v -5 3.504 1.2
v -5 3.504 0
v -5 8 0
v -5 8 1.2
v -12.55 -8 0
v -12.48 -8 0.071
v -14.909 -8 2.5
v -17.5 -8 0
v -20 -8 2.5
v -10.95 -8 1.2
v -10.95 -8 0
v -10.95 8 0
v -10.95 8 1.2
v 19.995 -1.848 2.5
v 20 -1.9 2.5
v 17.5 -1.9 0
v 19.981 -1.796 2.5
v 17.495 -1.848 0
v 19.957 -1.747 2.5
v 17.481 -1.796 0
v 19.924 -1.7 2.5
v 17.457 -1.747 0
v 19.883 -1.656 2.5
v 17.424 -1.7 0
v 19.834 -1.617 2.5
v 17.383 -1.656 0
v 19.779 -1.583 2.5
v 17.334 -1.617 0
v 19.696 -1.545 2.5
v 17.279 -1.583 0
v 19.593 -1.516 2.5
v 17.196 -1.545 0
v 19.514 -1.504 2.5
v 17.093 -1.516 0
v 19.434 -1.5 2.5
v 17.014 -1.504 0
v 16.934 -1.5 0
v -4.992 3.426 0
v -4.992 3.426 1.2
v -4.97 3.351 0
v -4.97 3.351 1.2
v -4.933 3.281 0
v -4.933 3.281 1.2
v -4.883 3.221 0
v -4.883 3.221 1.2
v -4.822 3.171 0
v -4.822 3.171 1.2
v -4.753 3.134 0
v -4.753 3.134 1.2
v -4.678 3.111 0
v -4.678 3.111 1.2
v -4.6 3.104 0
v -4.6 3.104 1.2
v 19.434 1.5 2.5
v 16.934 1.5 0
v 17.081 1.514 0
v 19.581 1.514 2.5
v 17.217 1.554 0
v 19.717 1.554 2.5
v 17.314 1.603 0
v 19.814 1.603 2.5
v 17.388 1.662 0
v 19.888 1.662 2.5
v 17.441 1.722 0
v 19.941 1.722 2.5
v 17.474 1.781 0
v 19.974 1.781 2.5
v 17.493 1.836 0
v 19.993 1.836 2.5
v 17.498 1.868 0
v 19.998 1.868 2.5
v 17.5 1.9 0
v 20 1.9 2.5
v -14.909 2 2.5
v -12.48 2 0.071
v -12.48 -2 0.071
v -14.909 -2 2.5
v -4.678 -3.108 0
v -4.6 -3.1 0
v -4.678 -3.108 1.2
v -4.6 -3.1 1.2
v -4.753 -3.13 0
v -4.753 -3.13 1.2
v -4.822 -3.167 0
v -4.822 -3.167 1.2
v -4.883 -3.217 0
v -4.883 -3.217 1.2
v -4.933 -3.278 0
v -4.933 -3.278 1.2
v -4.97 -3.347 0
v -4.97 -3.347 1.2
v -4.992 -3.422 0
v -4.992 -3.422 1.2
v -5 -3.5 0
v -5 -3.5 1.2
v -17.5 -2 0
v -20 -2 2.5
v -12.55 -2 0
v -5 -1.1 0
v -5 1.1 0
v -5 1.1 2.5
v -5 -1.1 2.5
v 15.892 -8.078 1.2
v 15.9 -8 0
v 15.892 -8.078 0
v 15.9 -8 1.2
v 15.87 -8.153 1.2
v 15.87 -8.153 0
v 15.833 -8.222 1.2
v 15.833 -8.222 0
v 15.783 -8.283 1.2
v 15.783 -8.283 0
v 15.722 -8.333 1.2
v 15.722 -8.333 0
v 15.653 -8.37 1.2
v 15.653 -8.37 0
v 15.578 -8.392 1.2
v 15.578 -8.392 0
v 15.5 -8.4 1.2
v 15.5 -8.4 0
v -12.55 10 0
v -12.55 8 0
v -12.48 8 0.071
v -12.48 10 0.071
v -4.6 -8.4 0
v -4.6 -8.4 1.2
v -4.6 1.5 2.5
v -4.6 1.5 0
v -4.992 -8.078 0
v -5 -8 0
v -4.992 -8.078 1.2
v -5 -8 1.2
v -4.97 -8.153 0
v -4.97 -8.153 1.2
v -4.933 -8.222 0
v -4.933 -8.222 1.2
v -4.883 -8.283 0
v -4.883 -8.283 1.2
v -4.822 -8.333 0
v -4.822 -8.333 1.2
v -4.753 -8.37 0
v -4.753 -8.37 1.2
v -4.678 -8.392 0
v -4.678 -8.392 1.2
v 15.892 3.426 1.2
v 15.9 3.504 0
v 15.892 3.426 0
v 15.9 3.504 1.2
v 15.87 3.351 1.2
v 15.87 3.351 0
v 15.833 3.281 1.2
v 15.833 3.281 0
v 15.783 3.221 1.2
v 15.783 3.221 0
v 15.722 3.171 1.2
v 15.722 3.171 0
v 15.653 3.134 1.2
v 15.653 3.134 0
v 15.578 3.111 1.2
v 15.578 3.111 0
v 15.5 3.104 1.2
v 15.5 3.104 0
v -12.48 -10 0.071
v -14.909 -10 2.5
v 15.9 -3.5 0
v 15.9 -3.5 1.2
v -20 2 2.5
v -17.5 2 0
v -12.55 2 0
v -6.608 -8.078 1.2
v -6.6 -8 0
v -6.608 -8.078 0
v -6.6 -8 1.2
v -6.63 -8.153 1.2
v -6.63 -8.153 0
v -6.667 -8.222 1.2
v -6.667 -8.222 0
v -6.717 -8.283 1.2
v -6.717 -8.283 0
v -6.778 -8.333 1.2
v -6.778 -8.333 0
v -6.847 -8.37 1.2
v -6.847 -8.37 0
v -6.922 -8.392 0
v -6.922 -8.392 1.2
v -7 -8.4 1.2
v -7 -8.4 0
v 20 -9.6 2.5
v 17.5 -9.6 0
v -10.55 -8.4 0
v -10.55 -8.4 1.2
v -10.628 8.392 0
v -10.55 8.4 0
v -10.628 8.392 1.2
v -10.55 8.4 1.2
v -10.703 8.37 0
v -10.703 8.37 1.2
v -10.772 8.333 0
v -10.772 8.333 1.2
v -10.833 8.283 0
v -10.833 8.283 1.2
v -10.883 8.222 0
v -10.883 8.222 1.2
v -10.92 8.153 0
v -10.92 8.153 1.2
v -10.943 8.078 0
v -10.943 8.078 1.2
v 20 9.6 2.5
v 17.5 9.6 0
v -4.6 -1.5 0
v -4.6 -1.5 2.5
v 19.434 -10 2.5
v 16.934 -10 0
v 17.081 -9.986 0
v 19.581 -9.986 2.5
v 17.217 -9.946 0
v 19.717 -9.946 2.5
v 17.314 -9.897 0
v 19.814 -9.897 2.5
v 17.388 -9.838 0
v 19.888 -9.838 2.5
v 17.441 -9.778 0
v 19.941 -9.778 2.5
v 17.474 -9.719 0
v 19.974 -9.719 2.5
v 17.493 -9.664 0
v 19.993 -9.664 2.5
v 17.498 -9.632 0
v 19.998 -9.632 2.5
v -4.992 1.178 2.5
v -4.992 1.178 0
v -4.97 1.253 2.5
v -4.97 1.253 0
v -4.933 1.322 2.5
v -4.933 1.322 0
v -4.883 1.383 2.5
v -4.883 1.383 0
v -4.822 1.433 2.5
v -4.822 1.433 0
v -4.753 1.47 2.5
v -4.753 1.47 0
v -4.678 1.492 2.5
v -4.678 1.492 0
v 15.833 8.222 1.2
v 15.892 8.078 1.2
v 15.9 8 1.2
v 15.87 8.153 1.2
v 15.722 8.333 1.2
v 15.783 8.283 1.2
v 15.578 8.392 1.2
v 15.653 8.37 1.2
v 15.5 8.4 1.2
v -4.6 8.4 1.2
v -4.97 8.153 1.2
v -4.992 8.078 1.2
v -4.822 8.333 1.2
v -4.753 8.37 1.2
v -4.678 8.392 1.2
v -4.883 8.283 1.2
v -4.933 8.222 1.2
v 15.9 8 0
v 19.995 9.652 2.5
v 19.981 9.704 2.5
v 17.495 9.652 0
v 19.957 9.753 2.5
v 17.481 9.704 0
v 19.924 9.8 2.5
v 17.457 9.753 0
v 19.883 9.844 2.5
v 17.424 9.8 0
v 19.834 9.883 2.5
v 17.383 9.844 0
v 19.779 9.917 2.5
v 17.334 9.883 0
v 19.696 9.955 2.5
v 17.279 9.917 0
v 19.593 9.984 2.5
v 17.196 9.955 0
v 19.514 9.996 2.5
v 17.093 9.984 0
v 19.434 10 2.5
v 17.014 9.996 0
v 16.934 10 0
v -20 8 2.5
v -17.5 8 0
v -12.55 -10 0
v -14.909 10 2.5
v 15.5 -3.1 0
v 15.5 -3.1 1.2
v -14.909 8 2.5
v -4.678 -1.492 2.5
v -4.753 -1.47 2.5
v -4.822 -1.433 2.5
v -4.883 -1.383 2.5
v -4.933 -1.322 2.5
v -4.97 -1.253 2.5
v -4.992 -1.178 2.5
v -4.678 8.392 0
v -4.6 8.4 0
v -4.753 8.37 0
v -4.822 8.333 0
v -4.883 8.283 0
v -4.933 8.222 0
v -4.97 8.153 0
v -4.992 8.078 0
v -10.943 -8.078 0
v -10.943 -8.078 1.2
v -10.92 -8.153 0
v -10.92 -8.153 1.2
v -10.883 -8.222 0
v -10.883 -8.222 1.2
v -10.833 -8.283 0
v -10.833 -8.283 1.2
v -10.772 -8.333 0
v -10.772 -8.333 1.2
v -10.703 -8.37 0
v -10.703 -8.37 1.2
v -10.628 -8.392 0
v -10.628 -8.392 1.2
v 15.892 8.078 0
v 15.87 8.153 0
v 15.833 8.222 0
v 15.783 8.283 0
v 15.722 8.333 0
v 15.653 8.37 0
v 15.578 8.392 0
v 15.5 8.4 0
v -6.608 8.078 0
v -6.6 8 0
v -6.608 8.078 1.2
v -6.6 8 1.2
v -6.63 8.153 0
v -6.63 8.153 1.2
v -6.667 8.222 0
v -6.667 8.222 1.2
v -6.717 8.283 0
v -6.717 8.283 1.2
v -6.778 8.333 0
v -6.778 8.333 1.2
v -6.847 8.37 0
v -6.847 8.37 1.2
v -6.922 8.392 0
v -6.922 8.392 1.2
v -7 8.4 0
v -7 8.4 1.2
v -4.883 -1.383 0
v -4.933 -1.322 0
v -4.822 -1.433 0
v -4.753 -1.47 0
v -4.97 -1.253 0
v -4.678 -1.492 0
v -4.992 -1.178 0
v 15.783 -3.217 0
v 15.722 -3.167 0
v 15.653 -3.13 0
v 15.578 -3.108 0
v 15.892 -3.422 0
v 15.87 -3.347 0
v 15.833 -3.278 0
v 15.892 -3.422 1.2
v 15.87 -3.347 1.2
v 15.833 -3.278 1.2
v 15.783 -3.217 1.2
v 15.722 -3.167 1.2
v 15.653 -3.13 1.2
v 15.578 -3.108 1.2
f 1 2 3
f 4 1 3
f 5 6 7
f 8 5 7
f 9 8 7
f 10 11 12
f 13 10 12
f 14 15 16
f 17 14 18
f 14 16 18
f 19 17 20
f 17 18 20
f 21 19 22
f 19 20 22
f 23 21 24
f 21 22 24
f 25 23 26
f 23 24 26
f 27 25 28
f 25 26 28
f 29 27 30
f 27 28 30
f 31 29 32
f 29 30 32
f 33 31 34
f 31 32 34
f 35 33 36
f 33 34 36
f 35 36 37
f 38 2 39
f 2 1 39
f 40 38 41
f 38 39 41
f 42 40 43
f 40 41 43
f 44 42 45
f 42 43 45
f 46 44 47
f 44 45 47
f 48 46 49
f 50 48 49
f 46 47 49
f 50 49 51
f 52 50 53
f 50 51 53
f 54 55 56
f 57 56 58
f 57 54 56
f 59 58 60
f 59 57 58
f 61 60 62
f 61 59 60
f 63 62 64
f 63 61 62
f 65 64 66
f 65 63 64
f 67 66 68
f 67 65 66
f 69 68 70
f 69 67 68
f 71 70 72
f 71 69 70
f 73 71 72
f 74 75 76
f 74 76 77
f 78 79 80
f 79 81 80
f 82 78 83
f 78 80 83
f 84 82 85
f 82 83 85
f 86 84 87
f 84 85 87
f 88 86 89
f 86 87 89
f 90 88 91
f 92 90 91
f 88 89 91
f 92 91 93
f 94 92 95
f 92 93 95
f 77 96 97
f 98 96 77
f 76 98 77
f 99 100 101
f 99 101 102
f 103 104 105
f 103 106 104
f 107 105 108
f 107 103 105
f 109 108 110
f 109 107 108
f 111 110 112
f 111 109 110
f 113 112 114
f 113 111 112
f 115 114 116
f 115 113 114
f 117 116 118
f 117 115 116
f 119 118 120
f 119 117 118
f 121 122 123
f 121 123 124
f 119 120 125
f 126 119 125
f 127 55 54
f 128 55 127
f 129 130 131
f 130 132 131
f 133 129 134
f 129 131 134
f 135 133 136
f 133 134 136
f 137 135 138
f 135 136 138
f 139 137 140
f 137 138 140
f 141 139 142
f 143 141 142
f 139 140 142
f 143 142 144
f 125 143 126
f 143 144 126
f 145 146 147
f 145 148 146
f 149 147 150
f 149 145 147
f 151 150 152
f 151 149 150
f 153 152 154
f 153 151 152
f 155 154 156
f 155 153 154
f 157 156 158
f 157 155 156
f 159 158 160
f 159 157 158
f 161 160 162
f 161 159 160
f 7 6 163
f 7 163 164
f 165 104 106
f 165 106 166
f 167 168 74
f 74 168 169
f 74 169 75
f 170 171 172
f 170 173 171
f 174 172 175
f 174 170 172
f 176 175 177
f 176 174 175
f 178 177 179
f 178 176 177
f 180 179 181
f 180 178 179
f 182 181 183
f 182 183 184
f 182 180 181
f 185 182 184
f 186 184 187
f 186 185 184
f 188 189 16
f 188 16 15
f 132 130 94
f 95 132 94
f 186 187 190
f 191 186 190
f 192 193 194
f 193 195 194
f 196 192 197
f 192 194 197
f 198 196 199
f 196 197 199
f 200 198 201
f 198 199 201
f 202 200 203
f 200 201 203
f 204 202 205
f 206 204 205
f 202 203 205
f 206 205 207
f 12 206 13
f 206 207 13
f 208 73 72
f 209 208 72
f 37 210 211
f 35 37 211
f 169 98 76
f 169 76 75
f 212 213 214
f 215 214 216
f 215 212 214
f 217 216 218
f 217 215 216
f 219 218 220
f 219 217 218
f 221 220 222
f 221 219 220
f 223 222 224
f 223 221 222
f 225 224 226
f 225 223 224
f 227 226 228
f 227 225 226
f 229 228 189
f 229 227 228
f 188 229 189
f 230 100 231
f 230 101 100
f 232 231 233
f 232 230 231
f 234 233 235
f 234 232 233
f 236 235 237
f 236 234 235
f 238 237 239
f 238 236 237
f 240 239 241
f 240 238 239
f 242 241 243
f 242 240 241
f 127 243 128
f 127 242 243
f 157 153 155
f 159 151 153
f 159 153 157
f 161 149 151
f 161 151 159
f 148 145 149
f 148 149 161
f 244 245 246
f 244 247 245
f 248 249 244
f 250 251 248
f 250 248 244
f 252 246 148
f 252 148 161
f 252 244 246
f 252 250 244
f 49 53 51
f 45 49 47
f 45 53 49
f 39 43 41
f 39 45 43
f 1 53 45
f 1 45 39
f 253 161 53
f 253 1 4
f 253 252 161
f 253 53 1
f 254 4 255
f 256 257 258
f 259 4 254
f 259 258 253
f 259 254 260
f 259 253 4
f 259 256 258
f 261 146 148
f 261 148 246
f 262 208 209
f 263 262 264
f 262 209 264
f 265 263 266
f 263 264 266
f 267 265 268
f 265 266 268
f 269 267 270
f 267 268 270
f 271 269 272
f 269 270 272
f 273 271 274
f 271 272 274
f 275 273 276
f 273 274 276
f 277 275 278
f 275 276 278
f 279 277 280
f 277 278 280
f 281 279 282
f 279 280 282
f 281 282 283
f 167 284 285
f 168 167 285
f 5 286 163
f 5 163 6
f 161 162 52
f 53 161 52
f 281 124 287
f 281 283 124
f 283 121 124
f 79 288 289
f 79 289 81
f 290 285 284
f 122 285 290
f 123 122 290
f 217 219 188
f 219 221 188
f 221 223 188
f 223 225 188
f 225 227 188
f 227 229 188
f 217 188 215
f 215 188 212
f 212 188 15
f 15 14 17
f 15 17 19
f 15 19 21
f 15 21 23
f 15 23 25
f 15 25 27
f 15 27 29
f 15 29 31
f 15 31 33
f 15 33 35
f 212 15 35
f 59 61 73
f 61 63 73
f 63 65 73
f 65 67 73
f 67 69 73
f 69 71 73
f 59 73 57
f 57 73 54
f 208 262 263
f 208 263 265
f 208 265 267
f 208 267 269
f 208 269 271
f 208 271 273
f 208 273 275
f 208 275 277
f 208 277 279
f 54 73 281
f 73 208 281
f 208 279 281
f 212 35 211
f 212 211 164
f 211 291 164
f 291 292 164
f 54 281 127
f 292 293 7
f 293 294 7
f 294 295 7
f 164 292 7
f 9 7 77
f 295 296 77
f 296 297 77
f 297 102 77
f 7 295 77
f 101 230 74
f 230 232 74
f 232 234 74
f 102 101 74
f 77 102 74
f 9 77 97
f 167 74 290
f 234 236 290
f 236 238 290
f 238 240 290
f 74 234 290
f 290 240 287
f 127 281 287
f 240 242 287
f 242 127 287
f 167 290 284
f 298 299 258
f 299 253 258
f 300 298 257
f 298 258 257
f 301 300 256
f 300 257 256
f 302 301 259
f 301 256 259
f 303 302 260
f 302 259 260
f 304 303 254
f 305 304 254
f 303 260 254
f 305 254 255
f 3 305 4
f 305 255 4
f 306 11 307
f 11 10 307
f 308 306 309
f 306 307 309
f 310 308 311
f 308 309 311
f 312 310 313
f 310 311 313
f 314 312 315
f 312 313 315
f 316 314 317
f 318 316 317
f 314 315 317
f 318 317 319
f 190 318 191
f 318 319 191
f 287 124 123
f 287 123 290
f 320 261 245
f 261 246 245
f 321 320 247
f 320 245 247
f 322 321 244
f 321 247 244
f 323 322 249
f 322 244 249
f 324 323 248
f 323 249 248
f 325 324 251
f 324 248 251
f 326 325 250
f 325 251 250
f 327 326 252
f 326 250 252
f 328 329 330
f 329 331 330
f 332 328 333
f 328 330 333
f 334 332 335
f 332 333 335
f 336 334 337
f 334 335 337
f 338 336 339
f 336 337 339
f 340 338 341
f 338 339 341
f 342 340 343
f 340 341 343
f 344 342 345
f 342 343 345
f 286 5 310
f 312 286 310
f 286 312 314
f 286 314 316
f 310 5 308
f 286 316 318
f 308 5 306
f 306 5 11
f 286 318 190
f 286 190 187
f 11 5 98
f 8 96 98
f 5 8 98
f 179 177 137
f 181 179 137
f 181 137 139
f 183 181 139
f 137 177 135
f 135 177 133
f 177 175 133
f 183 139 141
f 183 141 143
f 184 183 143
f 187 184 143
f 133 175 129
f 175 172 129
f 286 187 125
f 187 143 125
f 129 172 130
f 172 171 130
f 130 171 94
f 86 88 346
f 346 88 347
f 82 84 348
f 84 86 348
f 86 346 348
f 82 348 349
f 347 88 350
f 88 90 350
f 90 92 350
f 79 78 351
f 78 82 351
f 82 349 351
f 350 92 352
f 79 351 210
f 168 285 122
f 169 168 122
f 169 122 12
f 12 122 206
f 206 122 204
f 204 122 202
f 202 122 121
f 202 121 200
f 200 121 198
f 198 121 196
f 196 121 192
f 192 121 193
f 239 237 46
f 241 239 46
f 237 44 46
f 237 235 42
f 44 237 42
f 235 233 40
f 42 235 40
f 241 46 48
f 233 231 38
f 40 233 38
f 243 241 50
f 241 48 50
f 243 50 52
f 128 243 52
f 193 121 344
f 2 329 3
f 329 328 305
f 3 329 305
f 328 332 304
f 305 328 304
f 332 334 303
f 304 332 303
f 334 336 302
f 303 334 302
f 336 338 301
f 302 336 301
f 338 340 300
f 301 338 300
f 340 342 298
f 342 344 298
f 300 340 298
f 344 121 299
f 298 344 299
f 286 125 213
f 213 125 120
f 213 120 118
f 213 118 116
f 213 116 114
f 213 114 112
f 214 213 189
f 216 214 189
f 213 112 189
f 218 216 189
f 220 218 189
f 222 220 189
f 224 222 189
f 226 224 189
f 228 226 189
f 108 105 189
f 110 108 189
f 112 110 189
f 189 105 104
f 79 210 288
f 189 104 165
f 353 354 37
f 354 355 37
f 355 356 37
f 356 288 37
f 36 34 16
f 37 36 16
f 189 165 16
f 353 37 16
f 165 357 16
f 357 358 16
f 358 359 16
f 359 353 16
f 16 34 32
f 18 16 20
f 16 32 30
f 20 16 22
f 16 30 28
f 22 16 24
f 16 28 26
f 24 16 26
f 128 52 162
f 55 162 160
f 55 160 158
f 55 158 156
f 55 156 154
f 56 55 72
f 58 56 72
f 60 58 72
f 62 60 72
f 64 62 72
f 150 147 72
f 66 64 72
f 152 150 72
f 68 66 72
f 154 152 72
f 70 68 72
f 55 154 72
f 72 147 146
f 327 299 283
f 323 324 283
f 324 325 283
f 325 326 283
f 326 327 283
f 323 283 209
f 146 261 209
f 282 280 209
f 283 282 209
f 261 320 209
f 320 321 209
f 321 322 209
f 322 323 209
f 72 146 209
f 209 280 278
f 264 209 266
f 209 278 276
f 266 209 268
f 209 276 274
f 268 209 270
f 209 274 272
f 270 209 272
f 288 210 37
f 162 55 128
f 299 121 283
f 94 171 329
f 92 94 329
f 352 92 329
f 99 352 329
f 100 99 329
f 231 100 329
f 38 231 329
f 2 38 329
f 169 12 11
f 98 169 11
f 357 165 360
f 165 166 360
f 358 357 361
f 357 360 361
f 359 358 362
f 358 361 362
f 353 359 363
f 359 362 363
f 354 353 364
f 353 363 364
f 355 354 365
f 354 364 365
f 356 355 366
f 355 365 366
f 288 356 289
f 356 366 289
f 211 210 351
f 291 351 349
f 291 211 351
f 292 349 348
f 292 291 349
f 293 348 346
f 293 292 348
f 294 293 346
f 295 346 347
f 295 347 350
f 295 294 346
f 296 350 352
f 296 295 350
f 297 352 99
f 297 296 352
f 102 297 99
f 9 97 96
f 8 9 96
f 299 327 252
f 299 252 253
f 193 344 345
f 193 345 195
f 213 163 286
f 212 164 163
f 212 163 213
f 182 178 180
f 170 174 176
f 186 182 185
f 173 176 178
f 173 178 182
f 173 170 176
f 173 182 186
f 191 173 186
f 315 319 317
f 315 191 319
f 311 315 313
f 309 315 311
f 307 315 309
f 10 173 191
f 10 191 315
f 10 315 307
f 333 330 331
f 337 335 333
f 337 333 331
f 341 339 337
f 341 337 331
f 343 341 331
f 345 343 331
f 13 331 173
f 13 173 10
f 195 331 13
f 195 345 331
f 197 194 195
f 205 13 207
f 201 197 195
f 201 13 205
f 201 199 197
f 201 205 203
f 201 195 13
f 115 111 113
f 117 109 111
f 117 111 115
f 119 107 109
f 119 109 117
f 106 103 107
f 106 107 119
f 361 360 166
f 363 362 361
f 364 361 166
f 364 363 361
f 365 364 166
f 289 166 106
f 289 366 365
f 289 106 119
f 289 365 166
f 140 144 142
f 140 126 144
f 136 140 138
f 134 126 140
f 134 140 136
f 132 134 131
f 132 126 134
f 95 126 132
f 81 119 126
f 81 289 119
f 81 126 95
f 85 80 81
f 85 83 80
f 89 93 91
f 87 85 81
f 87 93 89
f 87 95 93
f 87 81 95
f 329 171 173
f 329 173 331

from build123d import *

# Parameters (mm, degrees)
BOSS_EXTRUDE1_DEPTH     = 2.5
CUT_EXTRUDE1_DEPTH      = 26.734218465
CUT_EXTRUDE2_DEPTH      = 26.734218465
BOSS_EXTRUDE2_DEPTH     = 2
BOSS_EXTRUDE3_DEPTH     = 2
CUT_EXTRUDE3_DEPTH      = 2
CUT_EXTRUDE3_DEPTH_BACK = 2
SKETCH9_W               = 3.535533906
SKETCH9_H               = 2
SKETCH9_H_2             = 4
CUT_EXTRUDE5_DEPTH      = 0.1
SKETCH10_W              = 20.9
SKETCH10_H              = 5.3
SKETCH10_H_2            = 5.296426242
SKETCH10_W_2            = 4.350252532
SKETCH10_H_3            = 16.8
CUT_EXTRUDE6_DEPTH      = 1.2
FILLET1_R               = 0.4


with BuildPart() as part:
    # Sketch1 → Boss-Extrude1 (new body)
    with BuildSketch(Plane.XY):
        Polygon((20, -1.5), (20, -8), (-20, -8), (-20, 8), (20, 8), (20, 1.5), (-5, 1.5), (-5, -1.5), align=None)
    extrude(amount=BOSS_EXTRUDE1_DEPTH)

    # Sketch2 → Cut-Extrude1 (cut, through all)
    with BuildSketch(Plane(origin=(0, 8, 0), x_dir=(1, 0, 0), z_dir=(0, 1, 0))):
        Polygon((20, -2.5), (17.5, 0), (20, 0), align=None)
    extrude(amount=-CUT_EXTRUDE1_DEPTH, mode=Mode.SUBTRACT)

    # Sketch5 → Cut-Extrude2 (cut, through all)
    with BuildSketch(Plane(origin=(0, 8, 0), x_dir=(1, 0, 0), z_dir=(0, 1, 0))):
        Polygon((-20, -2.5), (-17.5, 0), (-20, 0), align=None)
    extrude(amount=-CUT_EXTRUDE2_DEPTH, mode=Mode.SUBTRACT)

    # Sketch6 → Boss-Extrude2 (add)
    with BuildSketch(Plane(origin=(0, 8, 0), x_dir=(1, 0, 0), z_dir=(0, 1, 0))):
        Polygon((-12.550252532, 0), (-15.050252532, -2.5), (20, -2.5), (17.5, 0), align=None)
    extrude(amount=BOSS_EXTRUDE2_DEPTH)

    # Sketch7 → Boss-Extrude3 (add)
    with BuildSketch(Plane.XZ.offset(8)):
        Polygon((-12.550252532, 0), (17.5, 0), (20, 2.5), (-15.050252532, 2.5), align=None)
    extrude(amount=BOSS_EXTRUDE3_DEPTH)

    # Sketch8 → Cut-Extrude3 (cut, two sides: drawn at the far end of the back side and taken through both)
    with BuildSketch(Plane(origin=(0, 0, 0), x_dir=(1, 0, 0), z_dir=(0, 1, 0)).offset(-CUT_EXTRUDE3_DEPTH_BACK)):
        Polygon((-15.050252532, -2.5), (-12.550252532, 0), (-17.5, 0), (-20, -2.5), align=None)
    extrude(amount=CUT_EXTRUDE3_DEPTH + CUT_EXTRUDE3_DEPTH_BACK, mode=Mode.SUBTRACT)

    # Sketch9 → Cut-Extrude5 (cut)
    with BuildSketch(Plane(origin=(-6.275126266, 0, -6.275126266), x_dir=(-0.7071067811865476, 0, 0.7071067811865476), z_dir=(-0.7071067811865476, 0, -0.7071067811865476))):
        with Locations((10.642135624, 9)):
            Rectangle(SKETCH9_W, SKETCH9_H)
        with Locations((10.642135624, 0)):
            Rectangle(SKETCH9_W, SKETCH9_H_2)
        with Locations((10.642135624, -9)):
            Rectangle(SKETCH9_W, SKETCH9_H)
    extrude(amount=-CUT_EXTRUDE5_DEPTH, mode=Mode.SUBTRACT)

    # Sketch10 → Cut-Extrude6 (cut)
    with BuildSketch(Plane(origin=(0, 0, 0), x_dir=(-1, 0, 0), z_dir=(0, 0, -1))):
        with Locations((-5.45, -5.75)):
            Rectangle(SKETCH10_W, SKETCH10_H)
        with Locations((-5.45, 5.751786879)):
            Rectangle(SKETCH10_W, SKETCH10_H_2)
        with Locations((8.775126266, 0)):
            Rectangle(SKETCH10_W_2, SKETCH10_H_3)
    extrude(amount=-CUT_EXTRUDE6_DEPTH, mode=Mode.SUBTRACT)

    # Fillet1
    fillet1_edges = [part.edges().sort_by_distance(p)[0] for p in [
        (-5, 1.5, 1.25),
        (-5, -1.5, 1.25),
        (-10.950252532, 8.4, 0.6),
        (-10.950252532, -8.4, 0.6),
        (-6.6, -8.4, 0.6),
        (-6.6, 8.4, 0.6),
        (-5, 8.4, 0.6),
        (-5, 3.103573758, 0.6),
        (15.9, 3.103573758, 0.6),
        (15.9, 8.4, 0.6),
        (15.9, -8.4, 0.6),
        (15.9, -3.1, 0.6),
        (-5, -3.1, 0.6),
        (-5, -8.4, 0.6),
        (18.75, -1.5, 1.25),
        (18.75, 1.5, 1.25),
        (18.75, 10, 1.25),
        (18.75, -10, 1.25),
    ]]
    fillet(fillet1_edges, radius=FILLET1_R)


solid = part.part
